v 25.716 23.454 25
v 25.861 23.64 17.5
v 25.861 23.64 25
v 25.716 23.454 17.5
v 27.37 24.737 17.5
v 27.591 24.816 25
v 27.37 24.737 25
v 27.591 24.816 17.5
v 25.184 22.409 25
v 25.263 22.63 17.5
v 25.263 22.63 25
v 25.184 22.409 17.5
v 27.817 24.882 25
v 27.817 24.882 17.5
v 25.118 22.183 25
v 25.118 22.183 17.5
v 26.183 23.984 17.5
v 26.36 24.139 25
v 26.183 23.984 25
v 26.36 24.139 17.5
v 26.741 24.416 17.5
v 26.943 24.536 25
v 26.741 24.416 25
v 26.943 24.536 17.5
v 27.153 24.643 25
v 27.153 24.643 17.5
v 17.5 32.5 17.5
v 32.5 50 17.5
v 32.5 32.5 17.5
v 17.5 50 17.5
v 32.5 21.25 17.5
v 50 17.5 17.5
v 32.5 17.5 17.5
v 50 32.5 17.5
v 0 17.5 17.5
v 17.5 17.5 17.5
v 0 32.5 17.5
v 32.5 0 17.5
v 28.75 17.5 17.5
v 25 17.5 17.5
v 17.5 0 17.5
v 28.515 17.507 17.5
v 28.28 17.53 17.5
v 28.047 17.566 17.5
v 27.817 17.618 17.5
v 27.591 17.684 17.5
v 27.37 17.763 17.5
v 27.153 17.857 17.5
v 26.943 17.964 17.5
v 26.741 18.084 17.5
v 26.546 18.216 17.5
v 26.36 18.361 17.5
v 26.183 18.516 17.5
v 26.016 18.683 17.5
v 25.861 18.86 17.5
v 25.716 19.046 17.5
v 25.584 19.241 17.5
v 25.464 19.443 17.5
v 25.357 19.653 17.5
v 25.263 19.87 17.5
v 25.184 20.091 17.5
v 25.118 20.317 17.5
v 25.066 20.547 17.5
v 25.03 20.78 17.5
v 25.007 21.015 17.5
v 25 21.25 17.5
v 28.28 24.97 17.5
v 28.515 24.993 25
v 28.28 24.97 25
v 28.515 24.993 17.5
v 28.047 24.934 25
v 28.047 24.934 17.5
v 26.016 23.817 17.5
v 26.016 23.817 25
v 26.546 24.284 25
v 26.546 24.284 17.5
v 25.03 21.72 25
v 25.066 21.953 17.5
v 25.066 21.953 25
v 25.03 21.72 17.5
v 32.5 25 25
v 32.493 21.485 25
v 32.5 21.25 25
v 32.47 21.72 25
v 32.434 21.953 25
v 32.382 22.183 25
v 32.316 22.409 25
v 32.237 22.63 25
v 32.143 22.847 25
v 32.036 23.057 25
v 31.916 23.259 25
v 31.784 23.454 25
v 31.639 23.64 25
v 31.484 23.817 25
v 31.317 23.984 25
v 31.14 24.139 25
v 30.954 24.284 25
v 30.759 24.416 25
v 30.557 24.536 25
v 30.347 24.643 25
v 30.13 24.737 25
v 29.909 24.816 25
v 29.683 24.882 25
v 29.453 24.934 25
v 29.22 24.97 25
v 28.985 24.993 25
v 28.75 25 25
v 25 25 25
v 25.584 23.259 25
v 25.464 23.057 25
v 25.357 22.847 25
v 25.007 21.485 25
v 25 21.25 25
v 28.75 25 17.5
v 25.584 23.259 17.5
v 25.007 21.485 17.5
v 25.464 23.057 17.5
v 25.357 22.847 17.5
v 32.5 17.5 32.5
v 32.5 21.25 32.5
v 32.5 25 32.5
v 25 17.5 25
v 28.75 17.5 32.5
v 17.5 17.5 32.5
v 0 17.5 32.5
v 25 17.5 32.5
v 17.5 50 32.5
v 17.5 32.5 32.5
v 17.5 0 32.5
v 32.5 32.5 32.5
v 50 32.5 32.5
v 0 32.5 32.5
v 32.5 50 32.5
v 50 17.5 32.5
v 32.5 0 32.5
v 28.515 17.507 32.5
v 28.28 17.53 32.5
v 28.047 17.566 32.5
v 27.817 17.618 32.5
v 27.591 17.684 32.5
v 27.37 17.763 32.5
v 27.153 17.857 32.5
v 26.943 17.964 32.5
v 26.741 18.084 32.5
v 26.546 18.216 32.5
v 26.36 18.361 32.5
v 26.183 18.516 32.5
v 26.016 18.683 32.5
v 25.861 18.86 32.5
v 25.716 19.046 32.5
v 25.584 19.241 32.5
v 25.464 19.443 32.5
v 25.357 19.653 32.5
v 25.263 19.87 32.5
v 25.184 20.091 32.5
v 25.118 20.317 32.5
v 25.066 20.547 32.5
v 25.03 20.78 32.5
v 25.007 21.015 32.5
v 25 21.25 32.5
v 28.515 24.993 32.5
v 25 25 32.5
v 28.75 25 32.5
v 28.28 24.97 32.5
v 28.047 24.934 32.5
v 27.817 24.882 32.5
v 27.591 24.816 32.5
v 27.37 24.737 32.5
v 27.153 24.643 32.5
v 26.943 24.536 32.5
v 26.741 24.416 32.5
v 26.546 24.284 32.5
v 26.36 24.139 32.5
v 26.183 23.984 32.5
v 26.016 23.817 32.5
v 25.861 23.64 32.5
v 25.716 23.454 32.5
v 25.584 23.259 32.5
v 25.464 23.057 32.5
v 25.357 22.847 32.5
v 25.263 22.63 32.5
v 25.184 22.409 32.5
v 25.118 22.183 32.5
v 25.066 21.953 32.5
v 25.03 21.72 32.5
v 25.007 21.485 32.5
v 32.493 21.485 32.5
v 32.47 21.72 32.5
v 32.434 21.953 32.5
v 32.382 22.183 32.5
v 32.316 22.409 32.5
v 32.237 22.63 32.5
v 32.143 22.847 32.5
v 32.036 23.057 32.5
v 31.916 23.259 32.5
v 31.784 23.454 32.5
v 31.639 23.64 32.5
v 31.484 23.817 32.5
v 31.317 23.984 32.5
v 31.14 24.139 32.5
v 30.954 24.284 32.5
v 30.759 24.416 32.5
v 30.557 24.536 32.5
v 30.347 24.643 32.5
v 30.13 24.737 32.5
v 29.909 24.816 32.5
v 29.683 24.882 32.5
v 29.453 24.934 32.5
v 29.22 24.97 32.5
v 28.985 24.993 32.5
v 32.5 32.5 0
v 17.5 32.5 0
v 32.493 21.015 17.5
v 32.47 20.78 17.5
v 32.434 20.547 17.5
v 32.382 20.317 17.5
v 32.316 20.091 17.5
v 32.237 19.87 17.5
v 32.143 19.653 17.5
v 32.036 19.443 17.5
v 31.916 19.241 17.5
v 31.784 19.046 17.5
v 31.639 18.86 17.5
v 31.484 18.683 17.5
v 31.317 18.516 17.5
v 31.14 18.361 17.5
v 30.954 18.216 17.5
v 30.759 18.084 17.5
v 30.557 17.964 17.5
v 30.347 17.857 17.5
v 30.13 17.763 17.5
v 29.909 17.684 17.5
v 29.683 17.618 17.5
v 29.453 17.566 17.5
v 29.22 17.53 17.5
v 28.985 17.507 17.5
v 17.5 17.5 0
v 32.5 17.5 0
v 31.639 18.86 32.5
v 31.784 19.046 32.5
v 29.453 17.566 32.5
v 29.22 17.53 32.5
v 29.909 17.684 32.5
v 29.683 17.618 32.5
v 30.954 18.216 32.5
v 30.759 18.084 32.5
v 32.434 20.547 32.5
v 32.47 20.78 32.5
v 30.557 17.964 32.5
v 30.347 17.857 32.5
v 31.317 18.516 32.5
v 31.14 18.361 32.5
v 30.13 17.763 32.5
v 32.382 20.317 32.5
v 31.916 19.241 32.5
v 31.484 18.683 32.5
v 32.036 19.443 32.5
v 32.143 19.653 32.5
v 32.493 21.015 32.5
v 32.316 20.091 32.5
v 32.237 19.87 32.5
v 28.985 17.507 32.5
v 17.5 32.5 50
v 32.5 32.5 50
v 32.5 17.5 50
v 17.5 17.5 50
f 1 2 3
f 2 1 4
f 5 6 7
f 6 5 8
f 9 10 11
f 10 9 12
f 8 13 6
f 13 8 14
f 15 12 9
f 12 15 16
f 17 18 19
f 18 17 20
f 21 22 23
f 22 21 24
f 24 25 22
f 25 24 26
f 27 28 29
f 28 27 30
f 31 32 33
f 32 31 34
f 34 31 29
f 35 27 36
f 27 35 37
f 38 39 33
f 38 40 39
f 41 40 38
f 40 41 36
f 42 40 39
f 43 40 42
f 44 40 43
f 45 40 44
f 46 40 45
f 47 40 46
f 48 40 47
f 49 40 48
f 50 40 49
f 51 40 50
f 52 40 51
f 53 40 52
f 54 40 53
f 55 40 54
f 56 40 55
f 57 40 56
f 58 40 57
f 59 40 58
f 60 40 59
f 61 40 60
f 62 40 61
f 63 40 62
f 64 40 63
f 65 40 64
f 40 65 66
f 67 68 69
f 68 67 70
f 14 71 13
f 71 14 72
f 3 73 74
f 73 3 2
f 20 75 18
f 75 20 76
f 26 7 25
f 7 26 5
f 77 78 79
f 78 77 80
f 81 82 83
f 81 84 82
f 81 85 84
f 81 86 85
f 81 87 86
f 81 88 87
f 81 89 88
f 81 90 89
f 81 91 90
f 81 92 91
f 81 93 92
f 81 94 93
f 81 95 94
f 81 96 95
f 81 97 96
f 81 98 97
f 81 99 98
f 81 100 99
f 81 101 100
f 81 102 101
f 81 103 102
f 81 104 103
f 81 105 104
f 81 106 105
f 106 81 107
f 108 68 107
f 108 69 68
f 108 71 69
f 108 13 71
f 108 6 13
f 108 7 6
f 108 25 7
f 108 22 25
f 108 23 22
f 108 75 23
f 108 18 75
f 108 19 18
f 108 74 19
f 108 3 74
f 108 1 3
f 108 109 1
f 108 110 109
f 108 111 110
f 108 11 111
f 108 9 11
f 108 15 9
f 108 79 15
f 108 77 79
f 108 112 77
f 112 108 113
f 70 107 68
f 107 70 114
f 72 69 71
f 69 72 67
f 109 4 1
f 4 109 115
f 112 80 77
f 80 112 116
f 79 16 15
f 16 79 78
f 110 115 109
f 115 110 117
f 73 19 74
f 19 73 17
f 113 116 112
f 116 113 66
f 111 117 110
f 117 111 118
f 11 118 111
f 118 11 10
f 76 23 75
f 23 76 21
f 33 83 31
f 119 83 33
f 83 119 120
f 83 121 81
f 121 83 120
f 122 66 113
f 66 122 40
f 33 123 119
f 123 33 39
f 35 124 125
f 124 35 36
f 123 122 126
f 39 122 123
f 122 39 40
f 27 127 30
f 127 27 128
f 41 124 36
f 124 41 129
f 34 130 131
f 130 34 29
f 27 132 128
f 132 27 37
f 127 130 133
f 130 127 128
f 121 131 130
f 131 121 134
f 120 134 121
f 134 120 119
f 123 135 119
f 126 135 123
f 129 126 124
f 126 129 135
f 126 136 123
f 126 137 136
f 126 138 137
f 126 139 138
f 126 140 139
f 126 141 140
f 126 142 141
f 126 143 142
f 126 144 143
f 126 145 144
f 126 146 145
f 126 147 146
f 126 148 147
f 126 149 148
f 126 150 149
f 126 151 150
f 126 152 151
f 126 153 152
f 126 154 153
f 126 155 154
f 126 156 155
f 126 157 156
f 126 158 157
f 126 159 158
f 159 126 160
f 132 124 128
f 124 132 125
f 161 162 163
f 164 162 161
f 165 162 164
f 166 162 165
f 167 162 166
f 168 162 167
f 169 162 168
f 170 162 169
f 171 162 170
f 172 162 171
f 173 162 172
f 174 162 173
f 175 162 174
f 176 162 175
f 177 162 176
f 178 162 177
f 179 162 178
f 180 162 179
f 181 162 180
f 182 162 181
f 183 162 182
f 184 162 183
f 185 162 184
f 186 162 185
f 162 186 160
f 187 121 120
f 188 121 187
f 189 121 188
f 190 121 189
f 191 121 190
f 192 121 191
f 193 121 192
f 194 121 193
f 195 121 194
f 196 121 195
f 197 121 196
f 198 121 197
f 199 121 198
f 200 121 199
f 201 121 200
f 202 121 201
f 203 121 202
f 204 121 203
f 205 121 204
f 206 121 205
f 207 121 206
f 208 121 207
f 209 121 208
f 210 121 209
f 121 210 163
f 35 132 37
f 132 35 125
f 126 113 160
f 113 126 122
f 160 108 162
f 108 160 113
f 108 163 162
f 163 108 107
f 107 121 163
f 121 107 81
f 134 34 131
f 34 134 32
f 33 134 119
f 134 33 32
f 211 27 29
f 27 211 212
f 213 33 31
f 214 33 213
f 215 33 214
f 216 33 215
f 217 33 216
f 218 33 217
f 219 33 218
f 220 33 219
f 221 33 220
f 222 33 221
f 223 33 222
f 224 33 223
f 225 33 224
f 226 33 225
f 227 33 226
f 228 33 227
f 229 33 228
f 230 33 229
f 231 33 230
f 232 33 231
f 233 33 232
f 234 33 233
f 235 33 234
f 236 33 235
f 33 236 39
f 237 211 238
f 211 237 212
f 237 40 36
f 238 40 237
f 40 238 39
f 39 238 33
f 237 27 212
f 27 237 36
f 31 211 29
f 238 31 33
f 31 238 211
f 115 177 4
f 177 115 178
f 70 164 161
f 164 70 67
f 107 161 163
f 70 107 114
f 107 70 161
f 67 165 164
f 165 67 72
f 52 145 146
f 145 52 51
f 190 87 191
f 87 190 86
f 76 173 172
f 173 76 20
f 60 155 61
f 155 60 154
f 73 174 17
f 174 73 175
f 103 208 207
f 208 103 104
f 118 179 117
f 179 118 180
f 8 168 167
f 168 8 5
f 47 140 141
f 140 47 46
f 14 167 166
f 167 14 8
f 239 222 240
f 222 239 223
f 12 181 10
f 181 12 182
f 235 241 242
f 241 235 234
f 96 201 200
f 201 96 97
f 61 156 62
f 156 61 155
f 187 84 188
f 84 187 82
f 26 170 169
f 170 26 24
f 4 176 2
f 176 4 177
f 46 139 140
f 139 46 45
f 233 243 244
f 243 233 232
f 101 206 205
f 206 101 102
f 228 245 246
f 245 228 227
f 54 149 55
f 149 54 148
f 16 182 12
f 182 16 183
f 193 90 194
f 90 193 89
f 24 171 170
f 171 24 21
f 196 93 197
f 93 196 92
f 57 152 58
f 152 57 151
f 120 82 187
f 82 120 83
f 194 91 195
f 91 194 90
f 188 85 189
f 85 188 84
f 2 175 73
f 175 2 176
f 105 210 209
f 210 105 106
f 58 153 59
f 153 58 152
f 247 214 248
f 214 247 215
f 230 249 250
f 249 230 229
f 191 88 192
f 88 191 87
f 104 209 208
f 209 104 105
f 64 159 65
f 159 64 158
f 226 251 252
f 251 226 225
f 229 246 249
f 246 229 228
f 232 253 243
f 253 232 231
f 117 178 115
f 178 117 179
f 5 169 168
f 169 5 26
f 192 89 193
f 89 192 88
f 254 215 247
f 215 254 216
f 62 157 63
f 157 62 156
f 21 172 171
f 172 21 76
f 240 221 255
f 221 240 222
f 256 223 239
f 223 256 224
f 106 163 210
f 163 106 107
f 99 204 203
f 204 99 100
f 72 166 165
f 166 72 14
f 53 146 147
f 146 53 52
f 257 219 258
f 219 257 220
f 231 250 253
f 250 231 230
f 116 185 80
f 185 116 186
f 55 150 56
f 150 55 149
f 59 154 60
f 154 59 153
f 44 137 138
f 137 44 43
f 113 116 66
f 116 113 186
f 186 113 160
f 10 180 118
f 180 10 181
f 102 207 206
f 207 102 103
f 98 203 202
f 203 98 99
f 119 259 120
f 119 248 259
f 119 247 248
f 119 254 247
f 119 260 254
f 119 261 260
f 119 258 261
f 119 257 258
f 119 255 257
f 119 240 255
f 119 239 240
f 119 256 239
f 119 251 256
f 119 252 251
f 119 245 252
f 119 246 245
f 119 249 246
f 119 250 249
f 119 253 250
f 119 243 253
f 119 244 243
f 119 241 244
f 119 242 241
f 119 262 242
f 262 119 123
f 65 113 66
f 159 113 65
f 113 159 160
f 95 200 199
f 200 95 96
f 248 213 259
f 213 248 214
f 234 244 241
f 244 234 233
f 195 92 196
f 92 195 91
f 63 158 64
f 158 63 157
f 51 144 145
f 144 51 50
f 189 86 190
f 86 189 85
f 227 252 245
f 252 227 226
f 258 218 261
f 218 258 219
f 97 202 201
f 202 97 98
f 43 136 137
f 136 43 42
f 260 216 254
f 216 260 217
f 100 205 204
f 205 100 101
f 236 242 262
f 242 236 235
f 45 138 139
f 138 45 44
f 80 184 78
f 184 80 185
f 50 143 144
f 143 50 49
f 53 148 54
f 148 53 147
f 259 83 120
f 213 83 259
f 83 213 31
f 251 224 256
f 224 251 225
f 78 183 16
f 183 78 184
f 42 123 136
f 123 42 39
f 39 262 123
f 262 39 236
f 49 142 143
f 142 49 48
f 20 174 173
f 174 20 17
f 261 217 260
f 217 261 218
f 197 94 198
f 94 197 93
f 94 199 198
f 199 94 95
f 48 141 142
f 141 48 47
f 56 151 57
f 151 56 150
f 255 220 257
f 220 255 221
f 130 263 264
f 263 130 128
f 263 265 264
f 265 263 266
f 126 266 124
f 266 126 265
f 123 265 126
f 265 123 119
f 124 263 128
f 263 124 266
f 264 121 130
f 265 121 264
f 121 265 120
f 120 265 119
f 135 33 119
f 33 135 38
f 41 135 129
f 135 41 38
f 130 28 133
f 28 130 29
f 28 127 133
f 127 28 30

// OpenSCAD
// This creates a 三方仕口 (san-pou shi-kuchi) joint, which
// allows one to join three cuboids without any sort of
// screws or nail like tools
//
// x_bar, y_bar, and z_bar are each named simply after the
// axis in which each module have the longest dimension
//
// The model has no leeway in the joint sections, therefore
// you may have to file down the surface a bit to create
// enough space for the models to smoothly move.

module x_bar(side=15, wing=17.5) {
        cube([wing, side, side]);
        translate([wing+side/2, side/2, side/2])
            cube([side/2, side/2, side/2]);
        difference() {
            translate([wing, 0, 0]) cube([side, side, side/2]);
            union() {
                translate([wing+side*3/4, side/4, 0]) cylinder(h=side/2, r=side/4, $fn=100);
                translate([wing+side/2, 0, 0]) cube([side/2, side/4, side/2]);
            }
        }
        translate([wing+side, 0, 0]) cube([wing, side, side]);
        

}

module y_bar(side=15, wing=17.5) {
    cube([side, wing, side]);
    
    translate([0, wing, side/2])
        cube([side/2, side, side/2]);
    
    translate([0, wing+side, 0])
        cube([side, wing, side]);
}

module z_bar(side=15, wing=17.5) {
    // move to "locked" rotation/location, because that makes
    // it easier to visually check if the design is correct
    translate([side, 0, 0])
        rotate([0, 0, 90]) {
            //bottom
            cube([side, side, wing]);
            // middle
            translate([side/4, side/4, wing])
                cylinder(h=side, r=side/4, $fn=100);
            // top
            translate([0, 0, wing+side])
                cube([side, side, wing]);
        }
}

let (side=15, height=50, wing=(height-side)/2) {
    color("Blue", 1) translate([0, wing, wing]) x_bar(side=side, wing=wing);
    color("Red", 1) translate([wing, wing, 0]) z_bar(side=side);
    color("Green", 1) translate([wing, 0, wing]) y_bar(side=side, wing=wing);
}
